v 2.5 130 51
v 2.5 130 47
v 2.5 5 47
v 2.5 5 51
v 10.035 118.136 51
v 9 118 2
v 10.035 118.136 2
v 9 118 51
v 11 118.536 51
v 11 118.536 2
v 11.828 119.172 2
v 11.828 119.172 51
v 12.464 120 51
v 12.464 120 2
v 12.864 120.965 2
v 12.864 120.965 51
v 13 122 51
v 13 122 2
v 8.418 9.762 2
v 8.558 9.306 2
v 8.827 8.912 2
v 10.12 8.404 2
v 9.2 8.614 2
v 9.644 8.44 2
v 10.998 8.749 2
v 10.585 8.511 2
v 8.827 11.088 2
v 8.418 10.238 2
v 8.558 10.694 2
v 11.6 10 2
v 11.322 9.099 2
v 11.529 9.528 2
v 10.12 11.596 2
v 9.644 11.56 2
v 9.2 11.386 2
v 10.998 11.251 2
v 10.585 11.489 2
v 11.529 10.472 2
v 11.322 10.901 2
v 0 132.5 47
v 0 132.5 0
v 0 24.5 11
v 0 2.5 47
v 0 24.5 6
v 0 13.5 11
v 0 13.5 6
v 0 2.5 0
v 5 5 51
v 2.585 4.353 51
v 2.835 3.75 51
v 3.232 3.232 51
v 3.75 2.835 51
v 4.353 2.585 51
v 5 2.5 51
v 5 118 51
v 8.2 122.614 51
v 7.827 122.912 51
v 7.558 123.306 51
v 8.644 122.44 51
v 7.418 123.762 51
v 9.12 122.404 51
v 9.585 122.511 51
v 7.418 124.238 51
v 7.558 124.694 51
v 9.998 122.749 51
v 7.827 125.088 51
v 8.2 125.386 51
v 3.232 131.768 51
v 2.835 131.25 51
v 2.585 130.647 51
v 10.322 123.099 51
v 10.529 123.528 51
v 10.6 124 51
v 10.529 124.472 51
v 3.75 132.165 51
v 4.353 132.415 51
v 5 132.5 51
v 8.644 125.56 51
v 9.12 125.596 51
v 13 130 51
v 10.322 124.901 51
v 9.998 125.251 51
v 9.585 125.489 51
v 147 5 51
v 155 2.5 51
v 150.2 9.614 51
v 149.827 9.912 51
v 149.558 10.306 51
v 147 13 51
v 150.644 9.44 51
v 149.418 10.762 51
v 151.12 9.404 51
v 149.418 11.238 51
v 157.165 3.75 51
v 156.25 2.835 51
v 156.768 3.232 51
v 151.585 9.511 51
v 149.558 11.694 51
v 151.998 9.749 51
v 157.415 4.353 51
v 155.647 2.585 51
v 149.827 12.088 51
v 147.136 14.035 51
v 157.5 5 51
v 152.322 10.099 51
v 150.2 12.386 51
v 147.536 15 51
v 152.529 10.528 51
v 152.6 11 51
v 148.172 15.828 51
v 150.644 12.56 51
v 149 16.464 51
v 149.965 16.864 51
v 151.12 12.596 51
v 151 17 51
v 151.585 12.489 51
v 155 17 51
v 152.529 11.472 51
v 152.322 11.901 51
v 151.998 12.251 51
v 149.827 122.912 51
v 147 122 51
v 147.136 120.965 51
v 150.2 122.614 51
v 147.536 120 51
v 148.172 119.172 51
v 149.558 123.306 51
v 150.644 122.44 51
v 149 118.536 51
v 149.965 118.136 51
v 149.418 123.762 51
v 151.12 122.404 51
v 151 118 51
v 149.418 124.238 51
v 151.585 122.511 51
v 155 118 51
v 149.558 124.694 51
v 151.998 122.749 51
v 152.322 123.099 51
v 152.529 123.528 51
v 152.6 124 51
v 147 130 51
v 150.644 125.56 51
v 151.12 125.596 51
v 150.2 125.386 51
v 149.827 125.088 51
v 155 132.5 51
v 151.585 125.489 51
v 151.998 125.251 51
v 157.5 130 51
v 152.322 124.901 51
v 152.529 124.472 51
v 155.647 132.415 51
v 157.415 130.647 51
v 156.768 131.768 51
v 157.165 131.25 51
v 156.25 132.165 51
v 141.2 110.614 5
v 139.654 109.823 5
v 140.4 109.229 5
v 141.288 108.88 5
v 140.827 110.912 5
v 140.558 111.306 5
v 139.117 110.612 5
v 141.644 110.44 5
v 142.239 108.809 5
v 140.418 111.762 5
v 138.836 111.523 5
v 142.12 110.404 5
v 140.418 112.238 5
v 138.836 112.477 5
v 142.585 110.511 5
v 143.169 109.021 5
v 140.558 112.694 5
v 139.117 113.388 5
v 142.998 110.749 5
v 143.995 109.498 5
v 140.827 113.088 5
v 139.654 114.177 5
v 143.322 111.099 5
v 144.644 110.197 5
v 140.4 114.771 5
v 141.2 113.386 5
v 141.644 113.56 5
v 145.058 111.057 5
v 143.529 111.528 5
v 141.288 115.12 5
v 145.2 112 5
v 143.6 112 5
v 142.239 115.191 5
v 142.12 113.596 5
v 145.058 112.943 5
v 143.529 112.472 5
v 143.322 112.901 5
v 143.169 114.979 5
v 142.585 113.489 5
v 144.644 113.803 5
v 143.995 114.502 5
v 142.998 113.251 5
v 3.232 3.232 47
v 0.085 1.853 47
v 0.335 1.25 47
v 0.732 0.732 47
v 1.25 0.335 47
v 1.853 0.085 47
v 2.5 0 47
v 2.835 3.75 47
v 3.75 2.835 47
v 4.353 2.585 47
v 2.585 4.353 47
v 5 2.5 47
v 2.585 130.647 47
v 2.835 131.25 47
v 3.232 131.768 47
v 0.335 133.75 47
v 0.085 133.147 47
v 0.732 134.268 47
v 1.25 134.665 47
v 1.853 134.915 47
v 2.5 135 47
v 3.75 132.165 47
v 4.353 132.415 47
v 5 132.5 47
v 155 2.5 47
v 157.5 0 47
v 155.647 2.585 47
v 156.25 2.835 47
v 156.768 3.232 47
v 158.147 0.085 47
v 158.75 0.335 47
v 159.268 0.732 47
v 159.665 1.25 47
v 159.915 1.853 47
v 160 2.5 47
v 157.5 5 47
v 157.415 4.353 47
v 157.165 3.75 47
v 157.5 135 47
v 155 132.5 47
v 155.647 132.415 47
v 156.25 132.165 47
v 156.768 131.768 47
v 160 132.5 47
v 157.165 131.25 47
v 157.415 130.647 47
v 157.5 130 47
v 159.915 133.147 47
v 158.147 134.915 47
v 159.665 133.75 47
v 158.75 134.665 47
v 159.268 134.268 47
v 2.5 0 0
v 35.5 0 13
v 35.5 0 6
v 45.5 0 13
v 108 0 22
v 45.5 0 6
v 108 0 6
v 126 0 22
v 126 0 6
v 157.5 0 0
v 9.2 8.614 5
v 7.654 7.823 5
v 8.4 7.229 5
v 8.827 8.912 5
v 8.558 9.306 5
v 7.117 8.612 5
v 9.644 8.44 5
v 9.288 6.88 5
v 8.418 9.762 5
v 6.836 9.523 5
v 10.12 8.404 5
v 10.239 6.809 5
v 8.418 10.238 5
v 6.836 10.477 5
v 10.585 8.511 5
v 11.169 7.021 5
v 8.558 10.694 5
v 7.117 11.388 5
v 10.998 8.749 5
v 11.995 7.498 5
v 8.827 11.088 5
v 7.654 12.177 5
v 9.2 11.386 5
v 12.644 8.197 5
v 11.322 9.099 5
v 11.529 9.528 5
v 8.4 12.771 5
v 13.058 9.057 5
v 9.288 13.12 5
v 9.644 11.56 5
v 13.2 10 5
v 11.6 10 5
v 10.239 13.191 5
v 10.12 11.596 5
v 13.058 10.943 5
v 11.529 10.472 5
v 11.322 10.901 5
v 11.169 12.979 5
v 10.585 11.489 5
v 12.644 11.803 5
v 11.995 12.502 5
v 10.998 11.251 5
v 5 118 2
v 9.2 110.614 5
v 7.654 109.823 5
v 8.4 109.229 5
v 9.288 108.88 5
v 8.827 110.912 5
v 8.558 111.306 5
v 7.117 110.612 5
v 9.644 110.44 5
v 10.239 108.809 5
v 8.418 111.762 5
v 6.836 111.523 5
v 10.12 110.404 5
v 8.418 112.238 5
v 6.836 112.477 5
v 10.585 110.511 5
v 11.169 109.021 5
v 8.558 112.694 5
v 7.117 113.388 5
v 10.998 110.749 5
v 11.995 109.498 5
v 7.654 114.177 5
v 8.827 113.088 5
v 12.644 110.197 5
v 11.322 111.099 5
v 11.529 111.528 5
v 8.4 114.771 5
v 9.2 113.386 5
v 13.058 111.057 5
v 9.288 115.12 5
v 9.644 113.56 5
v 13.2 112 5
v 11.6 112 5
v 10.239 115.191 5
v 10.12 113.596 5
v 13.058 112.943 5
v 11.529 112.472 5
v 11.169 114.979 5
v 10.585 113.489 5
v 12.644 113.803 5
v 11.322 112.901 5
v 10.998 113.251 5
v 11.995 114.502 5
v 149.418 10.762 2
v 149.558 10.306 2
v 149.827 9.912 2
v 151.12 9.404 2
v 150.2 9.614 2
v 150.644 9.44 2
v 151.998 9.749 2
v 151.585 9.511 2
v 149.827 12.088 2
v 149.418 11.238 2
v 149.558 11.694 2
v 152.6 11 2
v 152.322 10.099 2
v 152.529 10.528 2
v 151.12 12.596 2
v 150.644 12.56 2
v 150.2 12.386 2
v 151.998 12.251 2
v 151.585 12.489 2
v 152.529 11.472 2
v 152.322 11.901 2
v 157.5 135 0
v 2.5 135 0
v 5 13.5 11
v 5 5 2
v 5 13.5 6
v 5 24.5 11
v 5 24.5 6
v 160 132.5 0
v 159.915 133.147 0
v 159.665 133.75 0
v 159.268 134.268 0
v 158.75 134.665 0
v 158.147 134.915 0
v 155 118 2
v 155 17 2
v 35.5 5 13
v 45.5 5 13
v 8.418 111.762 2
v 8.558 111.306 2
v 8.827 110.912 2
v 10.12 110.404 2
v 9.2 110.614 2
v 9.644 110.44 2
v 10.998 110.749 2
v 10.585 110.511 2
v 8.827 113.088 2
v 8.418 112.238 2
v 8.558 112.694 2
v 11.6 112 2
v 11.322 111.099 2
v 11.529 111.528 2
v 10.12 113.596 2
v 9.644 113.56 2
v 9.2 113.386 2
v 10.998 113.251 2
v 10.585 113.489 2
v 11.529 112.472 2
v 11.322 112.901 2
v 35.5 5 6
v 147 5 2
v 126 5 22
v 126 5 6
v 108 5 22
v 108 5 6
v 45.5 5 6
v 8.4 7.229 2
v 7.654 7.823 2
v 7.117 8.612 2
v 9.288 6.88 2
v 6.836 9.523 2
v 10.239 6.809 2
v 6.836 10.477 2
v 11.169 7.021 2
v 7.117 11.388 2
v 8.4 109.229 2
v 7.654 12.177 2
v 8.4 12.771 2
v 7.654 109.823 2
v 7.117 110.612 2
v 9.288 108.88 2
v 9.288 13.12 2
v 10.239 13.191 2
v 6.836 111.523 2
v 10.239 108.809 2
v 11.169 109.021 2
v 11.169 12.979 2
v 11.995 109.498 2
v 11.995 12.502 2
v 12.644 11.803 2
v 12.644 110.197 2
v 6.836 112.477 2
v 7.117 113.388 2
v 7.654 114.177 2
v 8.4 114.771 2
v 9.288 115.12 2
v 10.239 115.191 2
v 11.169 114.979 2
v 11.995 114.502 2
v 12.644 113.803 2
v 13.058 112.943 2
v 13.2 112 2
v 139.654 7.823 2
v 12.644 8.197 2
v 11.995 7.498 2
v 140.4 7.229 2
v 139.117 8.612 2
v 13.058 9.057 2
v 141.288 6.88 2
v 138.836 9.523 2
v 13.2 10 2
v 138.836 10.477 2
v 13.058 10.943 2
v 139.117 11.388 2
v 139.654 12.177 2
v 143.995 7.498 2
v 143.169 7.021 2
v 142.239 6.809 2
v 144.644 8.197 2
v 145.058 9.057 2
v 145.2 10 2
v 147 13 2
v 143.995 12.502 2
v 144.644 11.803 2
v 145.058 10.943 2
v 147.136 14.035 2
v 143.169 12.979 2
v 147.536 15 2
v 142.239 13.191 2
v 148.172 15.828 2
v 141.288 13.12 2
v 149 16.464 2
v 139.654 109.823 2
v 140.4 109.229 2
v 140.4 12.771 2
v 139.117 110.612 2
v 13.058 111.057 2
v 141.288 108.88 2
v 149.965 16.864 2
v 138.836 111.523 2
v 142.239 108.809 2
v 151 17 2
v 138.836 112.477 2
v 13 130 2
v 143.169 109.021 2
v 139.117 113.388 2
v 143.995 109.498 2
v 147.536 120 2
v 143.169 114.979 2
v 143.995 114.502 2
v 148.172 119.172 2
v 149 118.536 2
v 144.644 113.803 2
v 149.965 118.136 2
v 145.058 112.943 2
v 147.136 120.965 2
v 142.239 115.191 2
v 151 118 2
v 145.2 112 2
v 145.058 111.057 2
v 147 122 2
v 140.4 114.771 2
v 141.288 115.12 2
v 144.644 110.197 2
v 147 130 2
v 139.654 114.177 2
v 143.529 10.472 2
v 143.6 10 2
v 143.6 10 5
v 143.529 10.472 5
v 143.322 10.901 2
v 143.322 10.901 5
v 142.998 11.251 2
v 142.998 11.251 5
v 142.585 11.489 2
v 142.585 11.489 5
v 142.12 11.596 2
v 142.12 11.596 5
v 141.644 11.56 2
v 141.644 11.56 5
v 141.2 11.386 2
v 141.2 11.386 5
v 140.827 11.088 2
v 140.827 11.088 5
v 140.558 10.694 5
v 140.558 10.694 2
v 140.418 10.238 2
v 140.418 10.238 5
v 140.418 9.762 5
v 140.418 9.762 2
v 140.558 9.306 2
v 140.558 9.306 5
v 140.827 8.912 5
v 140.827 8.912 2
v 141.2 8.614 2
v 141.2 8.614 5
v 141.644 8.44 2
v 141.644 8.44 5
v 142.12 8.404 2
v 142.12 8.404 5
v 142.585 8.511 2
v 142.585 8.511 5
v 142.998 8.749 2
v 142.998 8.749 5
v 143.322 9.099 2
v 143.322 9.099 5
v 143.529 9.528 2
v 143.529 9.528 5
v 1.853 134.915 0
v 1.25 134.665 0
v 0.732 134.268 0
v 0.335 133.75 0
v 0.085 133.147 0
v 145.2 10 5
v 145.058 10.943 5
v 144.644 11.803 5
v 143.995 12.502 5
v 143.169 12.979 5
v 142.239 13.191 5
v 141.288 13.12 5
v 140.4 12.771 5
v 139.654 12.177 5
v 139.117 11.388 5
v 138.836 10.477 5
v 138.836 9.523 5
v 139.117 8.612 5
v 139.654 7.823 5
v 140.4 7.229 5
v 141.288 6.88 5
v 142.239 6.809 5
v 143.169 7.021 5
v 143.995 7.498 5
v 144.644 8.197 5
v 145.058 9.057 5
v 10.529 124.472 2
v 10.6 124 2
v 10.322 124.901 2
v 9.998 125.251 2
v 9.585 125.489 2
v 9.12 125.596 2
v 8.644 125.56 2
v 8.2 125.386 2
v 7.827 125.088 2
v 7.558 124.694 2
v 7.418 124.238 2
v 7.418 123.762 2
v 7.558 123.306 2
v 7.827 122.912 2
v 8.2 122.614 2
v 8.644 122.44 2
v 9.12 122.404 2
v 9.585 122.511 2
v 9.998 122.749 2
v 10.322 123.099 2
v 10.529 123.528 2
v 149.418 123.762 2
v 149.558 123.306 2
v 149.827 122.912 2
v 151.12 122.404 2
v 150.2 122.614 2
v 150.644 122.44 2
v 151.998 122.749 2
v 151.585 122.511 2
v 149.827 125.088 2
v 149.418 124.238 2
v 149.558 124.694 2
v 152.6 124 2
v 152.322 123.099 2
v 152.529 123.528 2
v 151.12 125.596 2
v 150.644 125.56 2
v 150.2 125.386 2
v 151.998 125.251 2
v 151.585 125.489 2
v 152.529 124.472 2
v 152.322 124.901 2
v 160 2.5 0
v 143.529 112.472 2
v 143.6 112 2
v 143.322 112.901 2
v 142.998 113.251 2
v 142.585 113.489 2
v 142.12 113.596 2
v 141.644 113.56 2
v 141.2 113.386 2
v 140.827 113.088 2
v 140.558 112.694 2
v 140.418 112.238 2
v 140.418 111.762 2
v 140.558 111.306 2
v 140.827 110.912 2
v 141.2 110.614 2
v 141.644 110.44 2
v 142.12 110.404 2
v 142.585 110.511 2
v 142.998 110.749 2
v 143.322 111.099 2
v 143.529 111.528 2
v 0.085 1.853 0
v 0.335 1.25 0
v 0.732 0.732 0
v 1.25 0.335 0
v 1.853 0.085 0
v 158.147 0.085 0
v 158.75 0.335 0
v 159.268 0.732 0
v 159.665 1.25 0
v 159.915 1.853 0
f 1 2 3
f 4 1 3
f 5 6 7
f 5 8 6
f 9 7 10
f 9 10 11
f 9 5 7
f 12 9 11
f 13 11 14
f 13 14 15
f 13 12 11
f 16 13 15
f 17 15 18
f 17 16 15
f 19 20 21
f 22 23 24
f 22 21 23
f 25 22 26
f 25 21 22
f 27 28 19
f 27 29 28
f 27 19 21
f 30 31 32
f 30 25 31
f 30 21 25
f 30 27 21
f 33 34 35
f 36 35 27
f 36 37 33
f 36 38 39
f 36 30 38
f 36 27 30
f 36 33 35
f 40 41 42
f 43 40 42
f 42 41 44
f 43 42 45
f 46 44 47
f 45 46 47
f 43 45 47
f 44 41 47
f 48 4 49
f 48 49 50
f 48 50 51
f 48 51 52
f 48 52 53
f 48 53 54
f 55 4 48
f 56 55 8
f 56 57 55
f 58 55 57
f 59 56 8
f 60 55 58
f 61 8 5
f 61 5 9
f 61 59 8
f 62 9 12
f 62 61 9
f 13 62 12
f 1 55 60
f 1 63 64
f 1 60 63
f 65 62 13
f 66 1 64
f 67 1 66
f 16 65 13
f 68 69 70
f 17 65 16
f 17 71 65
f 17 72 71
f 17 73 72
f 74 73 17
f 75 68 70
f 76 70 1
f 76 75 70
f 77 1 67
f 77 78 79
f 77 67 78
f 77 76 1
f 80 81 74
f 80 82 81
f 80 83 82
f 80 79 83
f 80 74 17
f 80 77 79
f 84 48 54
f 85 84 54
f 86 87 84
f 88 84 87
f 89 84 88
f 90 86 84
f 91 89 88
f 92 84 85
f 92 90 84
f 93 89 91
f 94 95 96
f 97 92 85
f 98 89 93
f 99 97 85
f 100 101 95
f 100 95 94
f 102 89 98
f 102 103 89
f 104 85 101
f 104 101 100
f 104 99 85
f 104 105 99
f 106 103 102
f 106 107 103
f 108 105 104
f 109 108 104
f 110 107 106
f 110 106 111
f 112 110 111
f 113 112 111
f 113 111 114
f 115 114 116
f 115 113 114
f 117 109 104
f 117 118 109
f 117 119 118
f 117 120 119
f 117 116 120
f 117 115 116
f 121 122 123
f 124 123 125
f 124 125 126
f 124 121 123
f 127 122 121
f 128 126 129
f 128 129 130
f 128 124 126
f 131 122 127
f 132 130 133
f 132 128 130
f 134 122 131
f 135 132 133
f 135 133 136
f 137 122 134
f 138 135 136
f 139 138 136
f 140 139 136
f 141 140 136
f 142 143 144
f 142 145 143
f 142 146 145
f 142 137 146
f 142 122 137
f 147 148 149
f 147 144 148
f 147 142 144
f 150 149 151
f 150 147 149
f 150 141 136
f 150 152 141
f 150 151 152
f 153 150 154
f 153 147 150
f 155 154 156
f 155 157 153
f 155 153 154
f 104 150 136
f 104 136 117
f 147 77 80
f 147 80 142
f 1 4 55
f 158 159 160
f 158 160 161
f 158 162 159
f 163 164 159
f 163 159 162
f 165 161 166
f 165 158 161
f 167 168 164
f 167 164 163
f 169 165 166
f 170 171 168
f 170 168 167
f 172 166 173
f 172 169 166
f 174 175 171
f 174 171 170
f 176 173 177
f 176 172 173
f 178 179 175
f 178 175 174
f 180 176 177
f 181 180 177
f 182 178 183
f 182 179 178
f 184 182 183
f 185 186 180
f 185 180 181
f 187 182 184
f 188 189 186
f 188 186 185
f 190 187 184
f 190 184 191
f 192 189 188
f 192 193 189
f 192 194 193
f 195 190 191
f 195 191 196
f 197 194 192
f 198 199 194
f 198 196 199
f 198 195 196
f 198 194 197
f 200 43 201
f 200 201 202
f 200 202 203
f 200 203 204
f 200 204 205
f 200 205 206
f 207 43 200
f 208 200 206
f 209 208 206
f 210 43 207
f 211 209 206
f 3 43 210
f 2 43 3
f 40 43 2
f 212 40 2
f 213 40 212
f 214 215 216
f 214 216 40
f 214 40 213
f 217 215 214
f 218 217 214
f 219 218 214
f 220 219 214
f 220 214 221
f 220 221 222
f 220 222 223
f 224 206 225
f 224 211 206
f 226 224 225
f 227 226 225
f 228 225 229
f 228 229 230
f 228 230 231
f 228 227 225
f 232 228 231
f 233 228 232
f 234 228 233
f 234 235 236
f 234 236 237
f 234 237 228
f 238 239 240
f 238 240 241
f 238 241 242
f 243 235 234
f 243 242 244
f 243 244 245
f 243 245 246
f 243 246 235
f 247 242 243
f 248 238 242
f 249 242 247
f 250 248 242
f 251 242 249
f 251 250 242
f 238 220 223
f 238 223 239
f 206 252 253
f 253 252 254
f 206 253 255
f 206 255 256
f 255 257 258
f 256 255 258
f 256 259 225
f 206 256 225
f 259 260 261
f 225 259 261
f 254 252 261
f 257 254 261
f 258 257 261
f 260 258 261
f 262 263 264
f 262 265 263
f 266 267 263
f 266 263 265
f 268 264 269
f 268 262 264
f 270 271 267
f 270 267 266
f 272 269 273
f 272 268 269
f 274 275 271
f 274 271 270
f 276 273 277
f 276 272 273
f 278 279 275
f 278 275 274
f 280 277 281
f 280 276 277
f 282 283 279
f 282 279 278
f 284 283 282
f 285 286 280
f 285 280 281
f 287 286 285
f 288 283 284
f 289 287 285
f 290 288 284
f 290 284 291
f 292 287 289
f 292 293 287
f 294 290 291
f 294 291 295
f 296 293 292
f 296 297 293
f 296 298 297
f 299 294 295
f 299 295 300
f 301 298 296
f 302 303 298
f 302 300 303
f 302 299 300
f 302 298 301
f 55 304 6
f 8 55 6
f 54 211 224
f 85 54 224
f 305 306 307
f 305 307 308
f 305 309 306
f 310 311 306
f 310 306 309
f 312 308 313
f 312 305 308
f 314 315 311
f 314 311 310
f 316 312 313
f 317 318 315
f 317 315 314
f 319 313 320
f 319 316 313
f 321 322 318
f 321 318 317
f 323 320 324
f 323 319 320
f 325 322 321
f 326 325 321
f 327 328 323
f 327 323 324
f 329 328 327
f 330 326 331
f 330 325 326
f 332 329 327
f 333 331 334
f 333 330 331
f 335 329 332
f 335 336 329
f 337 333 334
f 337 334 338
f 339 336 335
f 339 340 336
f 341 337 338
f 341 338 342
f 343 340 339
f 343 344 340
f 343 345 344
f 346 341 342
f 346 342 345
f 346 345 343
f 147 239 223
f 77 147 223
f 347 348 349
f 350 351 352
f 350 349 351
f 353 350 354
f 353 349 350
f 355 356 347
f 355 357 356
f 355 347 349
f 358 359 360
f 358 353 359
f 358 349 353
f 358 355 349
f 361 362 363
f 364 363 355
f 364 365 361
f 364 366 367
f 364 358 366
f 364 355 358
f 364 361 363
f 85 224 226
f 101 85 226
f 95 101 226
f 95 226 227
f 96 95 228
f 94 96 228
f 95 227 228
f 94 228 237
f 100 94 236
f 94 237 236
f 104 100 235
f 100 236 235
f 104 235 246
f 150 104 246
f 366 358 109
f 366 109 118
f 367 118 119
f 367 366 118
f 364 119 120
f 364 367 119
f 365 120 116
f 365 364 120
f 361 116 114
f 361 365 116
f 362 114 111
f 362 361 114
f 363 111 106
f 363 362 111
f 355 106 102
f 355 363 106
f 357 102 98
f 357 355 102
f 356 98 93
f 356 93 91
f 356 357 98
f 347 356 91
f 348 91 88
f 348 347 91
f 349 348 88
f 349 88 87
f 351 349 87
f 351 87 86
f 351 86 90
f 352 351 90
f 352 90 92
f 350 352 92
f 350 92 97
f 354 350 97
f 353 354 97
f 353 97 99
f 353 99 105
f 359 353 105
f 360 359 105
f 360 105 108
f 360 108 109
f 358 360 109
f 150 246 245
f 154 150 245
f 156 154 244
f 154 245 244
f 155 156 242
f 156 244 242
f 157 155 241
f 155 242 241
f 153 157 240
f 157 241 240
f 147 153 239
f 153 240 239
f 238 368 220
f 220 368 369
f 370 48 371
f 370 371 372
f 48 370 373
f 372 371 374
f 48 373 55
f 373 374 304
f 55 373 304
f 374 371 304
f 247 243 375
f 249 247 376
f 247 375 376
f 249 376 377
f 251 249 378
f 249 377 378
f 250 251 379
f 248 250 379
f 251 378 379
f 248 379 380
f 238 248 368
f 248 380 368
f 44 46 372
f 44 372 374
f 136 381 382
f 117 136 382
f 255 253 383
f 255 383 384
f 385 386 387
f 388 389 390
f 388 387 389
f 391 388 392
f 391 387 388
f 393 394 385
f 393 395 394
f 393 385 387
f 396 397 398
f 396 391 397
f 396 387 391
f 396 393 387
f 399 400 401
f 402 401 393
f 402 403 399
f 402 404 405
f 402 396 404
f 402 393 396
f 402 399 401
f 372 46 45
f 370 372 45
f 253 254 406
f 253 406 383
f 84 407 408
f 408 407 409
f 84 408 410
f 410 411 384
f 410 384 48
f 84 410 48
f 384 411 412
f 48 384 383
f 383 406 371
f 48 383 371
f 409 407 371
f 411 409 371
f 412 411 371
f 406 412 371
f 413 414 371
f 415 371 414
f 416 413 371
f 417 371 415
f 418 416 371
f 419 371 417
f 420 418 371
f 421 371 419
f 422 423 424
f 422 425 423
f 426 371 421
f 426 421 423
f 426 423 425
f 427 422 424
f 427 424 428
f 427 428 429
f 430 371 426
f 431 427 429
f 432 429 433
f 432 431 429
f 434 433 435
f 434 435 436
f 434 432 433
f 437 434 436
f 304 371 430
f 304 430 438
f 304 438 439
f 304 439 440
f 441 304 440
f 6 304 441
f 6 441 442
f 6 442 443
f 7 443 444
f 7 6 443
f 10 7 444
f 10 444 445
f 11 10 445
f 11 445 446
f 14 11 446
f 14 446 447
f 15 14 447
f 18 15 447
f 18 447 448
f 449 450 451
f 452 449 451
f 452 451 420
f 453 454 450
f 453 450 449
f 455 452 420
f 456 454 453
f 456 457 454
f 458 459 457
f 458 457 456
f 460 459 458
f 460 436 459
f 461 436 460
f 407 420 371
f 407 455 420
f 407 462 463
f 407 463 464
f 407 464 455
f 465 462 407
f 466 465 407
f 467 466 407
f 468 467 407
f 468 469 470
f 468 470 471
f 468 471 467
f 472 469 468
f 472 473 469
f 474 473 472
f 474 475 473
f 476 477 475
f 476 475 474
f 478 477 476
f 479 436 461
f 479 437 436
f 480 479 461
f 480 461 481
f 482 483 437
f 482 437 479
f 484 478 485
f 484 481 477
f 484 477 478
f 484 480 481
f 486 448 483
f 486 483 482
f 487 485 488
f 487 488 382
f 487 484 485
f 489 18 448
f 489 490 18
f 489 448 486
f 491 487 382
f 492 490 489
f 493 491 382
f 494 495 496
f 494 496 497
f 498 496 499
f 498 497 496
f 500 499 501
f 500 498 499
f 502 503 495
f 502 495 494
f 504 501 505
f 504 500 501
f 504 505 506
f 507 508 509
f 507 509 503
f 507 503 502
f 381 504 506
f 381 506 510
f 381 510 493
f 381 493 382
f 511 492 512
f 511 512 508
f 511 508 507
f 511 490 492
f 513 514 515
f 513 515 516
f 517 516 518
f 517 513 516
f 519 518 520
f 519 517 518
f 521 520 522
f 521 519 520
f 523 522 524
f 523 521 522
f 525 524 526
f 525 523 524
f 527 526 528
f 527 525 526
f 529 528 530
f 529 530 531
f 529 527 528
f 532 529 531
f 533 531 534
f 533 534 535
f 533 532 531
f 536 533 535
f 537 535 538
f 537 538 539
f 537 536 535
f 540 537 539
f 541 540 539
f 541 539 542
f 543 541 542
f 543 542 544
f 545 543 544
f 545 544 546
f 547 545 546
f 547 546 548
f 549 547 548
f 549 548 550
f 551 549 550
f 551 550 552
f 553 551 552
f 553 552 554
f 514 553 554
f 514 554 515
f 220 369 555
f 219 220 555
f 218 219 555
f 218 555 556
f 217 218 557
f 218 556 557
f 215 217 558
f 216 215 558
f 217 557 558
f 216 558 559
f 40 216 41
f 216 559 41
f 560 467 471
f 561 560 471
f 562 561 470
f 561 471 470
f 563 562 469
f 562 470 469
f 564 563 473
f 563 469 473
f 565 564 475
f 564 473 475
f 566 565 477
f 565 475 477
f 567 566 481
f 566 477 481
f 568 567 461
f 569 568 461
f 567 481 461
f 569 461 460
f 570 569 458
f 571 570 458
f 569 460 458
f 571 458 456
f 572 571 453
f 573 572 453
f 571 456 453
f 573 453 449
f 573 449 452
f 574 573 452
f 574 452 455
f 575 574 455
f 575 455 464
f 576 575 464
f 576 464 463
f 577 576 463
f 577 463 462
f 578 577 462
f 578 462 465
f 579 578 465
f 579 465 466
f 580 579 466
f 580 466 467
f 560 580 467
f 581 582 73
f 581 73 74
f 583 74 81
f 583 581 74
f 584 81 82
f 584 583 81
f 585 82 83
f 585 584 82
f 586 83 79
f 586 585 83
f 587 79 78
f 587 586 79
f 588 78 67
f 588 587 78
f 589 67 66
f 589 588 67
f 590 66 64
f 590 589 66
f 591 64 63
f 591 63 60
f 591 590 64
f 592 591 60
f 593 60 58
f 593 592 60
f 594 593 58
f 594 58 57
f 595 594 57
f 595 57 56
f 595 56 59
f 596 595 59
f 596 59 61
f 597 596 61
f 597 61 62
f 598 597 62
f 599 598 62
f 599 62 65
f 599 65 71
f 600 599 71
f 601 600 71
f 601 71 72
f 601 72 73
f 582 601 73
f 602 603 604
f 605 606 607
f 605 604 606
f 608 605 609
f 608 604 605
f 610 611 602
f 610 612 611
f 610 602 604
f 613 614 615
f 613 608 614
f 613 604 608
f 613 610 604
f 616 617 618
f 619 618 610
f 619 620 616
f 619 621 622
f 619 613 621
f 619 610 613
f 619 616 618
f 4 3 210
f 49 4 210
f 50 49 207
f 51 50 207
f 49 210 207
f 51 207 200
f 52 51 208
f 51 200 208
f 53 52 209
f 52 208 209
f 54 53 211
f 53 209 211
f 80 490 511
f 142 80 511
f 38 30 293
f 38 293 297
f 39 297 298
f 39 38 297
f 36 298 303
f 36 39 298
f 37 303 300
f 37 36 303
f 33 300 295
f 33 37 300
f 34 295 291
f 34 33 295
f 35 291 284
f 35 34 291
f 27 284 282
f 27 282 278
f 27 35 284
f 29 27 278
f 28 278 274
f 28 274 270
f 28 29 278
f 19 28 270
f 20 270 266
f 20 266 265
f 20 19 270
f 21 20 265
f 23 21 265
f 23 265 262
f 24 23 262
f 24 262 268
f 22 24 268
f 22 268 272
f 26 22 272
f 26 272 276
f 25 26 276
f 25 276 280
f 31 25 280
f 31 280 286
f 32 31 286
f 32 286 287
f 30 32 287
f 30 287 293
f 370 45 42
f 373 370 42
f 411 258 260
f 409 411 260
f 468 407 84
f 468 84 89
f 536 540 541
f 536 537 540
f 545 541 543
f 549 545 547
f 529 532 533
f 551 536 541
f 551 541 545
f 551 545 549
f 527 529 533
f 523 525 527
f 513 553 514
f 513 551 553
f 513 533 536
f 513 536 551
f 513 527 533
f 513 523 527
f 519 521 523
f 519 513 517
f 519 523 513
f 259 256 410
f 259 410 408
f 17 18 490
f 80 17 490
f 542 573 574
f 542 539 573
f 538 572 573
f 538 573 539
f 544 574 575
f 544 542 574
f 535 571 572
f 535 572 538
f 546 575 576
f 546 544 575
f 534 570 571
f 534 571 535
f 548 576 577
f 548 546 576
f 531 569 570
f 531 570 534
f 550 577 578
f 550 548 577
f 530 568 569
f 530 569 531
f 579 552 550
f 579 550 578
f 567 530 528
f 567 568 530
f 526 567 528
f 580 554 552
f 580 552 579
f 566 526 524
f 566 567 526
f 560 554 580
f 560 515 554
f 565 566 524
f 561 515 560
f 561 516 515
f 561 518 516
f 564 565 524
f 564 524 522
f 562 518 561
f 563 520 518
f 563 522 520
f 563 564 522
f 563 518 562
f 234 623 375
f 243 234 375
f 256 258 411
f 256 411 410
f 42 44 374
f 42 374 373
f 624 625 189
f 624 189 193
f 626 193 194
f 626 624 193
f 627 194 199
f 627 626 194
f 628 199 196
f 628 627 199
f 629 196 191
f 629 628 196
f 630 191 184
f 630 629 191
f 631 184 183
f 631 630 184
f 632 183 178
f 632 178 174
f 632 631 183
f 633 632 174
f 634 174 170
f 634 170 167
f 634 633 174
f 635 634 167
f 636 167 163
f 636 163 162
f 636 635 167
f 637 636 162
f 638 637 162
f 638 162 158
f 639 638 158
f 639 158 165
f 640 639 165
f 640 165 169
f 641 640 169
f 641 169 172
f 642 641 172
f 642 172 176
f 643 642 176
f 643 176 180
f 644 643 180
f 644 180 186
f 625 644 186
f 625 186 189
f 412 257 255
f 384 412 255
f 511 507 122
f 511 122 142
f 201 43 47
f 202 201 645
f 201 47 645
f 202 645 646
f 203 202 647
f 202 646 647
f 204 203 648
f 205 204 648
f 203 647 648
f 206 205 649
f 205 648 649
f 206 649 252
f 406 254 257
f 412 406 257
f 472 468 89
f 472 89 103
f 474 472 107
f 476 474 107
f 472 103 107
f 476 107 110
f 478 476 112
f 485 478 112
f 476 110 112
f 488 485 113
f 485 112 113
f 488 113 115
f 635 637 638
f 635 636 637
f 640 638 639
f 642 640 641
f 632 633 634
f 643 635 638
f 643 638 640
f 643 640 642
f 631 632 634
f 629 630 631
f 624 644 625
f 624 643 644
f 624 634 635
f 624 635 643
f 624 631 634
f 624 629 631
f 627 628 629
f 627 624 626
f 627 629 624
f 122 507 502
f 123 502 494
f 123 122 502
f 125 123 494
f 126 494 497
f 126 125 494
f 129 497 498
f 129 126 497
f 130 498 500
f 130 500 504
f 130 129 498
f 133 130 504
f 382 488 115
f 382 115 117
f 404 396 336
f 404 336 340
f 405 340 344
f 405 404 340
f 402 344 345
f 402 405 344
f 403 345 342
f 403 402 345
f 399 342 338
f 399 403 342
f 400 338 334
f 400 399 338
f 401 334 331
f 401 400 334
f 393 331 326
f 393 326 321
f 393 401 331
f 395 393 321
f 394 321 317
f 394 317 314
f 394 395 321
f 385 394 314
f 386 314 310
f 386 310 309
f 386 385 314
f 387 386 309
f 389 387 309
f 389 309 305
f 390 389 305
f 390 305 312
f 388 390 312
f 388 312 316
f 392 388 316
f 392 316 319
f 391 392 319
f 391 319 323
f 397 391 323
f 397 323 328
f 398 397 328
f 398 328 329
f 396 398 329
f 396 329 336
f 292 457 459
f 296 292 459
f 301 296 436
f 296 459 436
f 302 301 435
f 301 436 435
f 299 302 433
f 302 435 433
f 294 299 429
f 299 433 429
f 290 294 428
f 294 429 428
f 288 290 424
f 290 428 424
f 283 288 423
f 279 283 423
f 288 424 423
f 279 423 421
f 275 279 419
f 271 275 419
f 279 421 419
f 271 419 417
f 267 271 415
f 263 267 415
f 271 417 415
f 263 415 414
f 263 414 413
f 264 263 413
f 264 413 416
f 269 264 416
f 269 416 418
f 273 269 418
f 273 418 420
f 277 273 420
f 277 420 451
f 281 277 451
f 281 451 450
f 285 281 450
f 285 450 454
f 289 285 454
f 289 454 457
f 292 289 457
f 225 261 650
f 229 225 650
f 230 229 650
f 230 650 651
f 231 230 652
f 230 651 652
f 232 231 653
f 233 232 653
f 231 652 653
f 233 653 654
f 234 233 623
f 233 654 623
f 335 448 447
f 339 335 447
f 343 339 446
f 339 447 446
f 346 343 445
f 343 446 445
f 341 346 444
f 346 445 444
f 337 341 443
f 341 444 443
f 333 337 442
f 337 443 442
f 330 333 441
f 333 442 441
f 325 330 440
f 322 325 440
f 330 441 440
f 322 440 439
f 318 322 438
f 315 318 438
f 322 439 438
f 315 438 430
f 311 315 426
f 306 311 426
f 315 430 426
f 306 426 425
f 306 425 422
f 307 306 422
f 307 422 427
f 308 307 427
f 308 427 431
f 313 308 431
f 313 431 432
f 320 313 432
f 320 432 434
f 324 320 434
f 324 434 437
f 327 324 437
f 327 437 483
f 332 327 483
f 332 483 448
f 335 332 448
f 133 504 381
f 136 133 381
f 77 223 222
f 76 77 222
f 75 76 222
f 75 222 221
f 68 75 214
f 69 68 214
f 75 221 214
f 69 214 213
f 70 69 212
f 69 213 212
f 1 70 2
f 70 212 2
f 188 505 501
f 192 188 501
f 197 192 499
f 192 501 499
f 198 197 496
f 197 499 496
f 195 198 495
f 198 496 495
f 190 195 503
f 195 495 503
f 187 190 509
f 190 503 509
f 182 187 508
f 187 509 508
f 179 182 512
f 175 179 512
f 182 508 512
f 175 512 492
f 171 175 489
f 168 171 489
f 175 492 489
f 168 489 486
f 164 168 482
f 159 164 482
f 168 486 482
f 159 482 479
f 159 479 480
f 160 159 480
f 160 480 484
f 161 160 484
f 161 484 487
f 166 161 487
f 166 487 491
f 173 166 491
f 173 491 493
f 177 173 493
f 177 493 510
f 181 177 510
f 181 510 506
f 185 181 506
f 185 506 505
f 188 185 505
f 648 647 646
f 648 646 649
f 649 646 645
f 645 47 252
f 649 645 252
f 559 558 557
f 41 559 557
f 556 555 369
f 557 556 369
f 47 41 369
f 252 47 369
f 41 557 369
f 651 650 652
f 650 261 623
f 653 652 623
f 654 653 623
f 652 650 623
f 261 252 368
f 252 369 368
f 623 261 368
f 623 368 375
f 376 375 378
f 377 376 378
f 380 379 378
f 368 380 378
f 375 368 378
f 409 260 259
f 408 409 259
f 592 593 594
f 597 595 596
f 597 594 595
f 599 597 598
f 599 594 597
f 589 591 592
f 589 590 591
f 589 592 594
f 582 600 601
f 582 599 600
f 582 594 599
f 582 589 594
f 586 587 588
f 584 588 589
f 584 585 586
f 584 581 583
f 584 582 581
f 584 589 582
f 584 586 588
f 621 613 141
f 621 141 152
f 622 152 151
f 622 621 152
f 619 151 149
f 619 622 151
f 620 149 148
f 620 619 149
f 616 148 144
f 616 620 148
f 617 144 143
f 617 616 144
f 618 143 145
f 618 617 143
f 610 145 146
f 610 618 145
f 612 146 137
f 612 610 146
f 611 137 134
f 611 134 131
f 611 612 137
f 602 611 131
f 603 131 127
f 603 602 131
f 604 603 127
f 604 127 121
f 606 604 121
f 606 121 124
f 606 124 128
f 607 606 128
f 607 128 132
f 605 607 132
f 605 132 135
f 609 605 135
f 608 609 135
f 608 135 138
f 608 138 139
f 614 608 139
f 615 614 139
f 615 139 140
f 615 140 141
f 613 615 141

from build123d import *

# Parameters (mm, degrees)
ESQUISSE1_W             = 150
ESQUISSE1_H             = 125
BOSS_EXTRU_3_DEPTH      = 2
BOSS_EXTRU_4_DEPTH      = 51
BOSS_EXTRU_6_DEPTH      = 47
ESQUISSE1_9_R           = 3.2
ESQUISSE1_9_R_2         = 1.6
BOSS_EXTRU_7_DEPTH      = 5
ESQUISSE3_W             = 18
ESQUISSE3_H             = 16
ESQUISSE3_W_2           = 10
ESQUISSE3_H_2           = 7
ENL_V_MAT_EXTRU_1_DEPTH = 15
ESQUISSE4_W             = 5
ESQUISSE4_H             = 11
ENL_V_MAT_EXTRU_2_DEPTH = 15
ESQUISSE1_12_W          = 8
ESQUISSE1_12_H          = 12
ESQUISSE1_12_R          = 1.6
BOSS_EXTRU_8_DEPTH      = 51
CONG_5_R                = 4


with BuildPart() as part:
    # Esquisse1 → Boss.-Extru.3 (new body)
    with BuildSketch(Plane.XY):
        with Locations((80, 67.5)):
            Rectangle(ESQUISSE1_W, ESQUISSE1_H)
    extrude(amount=BOSS_EXTRU_3_DEPTH)

    # Esquisse1<6> → Boss.-Extru.4 (add)
    with BuildSketch(Plane.XY):
        with BuildLine():
            ThreePointArc((2.5, 5), (3.232233047, 3.232233047), (5, 2.5))
            Line((5, 2.5), (155, 2.5))
            ThreePointArc((155, 2.5), (156.767766953, 3.232233047), (157.5, 5))
            Line((157.5, 5), (157.5, 130))
            ThreePointArc((157.5, 130), (156.767766953, 131.767766953), (155, 132.5))
            Line((155, 132.5), (5, 132.5))
            ThreePointArc((5, 132.5), (3.232233047, 131.767766953), (2.5, 130))
            Line((2.5, 130), (2.5, 5))
        make_face()
        Polygon((147, 5), (5, 5), (5, 118), (5, 130), (13, 130), (147, 130), (155, 130), (155, 118), (155, 17), (155, 5), align=None, mode=Mode.SUBTRACT)
    extrude(amount=BOSS_EXTRU_4_DEPTH)

    # Esquisse1<8> → Boss.-Extru.6 (add)
    with BuildSketch(Plane.XY):
        with BuildLine():
            ThreePointArc((0, 2.5), (0.732233047, 0.732233047), (2.5, 0))
            Line((2.5, 0), (157.5, 0))
            ThreePointArc((157.5, 0), (159.267766953, 0.732233047), (160, 2.5))
            Line((160, 2.5), (160, 132.5))
            ThreePointArc((160, 132.5), (159.267766953, 134.267766953), (157.5, 135))
            Line((157.5, 135), (2.5, 135))
            ThreePointArc((2.5, 135), (0.732233047, 134.267766953), (0, 132.5))
            Line((0, 132.5), (0, 2.5))
        make_face()
        with BuildLine():
            Line((155, 2.5), (5, 2.5))
            ThreePointArc((5, 2.5), (3.232233047, 3.232233047), (2.5, 5))
            Line((2.5, 5), (2.5, 130))
            ThreePointArc((2.5, 130), (3.232233047, 131.767766953), (5, 132.5))
            Line((5, 132.5), (155, 132.5))
            ThreePointArc((155, 132.5), (156.767766953, 131.767766953), (157.5, 130))
            Line((157.5, 130), (157.5, 5))
            ThreePointArc((157.5, 5), (156.767766953, 3.232233047), (155, 2.5))
        make_face(mode=Mode.SUBTRACT)
    extrude(amount=BOSS_EXTRU_6_DEPTH)

    # Esquisse1<9> → Boss.-Extru.7 (add)
    # profile 1 of 4: a face of its own
    with BuildSketch(Plane.XY):
        with Locations((10, 10)):
            Circle(ESQUISSE1_9_R)
        with Locations((10, 10)):
            Circle(ESQUISSE1_9_R_2, mode=Mode.SUBTRACT)
    # profile 2 of 4: a face of its own
    with BuildSketch(Plane.XY):
        with Locations((142, 10)):
            Circle(ESQUISSE1_9_R)
        with Locations((142, 10)):
            Circle(ESQUISSE1_9_R_2, mode=Mode.SUBTRACT)
    # profile 3 of 4: a face of its own
    with BuildSketch(Plane.XY):
        with Locations((142, 112)):
            Circle(ESQUISSE1_9_R)
        with Locations((142, 112)):
            Circle(ESQUISSE1_9_R_2, mode=Mode.SUBTRACT)
    # profile 4 of 4: a face of its own
    with BuildSketch(Plane.XY):
        with Locations((10, 112)):
            Circle(ESQUISSE1_9_R)
        with Locations((10, 112)):
            Circle(ESQUISSE1_9_R_2, mode=Mode.SUBTRACT)
    extrude(amount=BOSS_EXTRU_7_DEPTH)

    # Esquisse3 → Enlèv. mat.-Extru.1 (cut)
    with BuildSketch(Plane.XZ):
        with Locations((117, 14)):
            Rectangle(ESQUISSE3_W, ESQUISSE3_H)
        with Locations((40.5, 9.5)):
            Rectangle(ESQUISSE3_W_2, ESQUISSE3_H_2)
    extrude(amount=-ENL_V_MAT_EXTRU_1_DEPTH, mode=Mode.SUBTRACT)

    # Esquisse4 → Enlèv. mat.-Extru.2 (cut)
    with BuildSketch(Plane.ZY):
        with Locations((8.5, 19)):
            Rectangle(ESQUISSE4_W, ESQUISSE4_H)
    extrude(amount=-ENL_V_MAT_EXTRU_2_DEPTH, mode=Mode.SUBTRACT)

    # Esquisse1<12> → Boss.-Extru.8 (add)
    # profile 1 of 3: a face of its own
    with BuildSketch(Plane.XY):
        with Locations((151, 11)):
            Rectangle(ESQUISSE1_12_W, ESQUISSE1_12_H)
        with Locations((151, 11)):
            Circle(ESQUISSE1_12_R, mode=Mode.SUBTRACT)
    # profile 2 of 3: a face of its own
    with BuildSketch(Plane.XY):
        with Locations((9, 124)):
            Rectangle(ESQUISSE1_12_W, ESQUISSE1_12_H)
        with Locations((9, 124)):
            Circle(ESQUISSE1_12_R, mode=Mode.SUBTRACT)
    # profile 3 of 3: a face of its own
    with BuildSketch(Plane.XY):
        with Locations((151, 124)):
            Rectangle(ESQUISSE1_12_W, ESQUISSE1_12_H)
        with Locations((151, 124)):
            Circle(ESQUISSE1_12_R, mode=Mode.SUBTRACT)
    extrude(amount=BOSS_EXTRU_8_DEPTH)

    # Congé5
    cong_5_edges = [part.edges().sort_by_distance(p)[0] for p in [
        (147, 17, 26.5),
        (147, 118, 26.5),
        (13, 118, 26.5),
    ]]
    fillet(cong_5_edges, radius=CONG_5_R)


solid = part.part
